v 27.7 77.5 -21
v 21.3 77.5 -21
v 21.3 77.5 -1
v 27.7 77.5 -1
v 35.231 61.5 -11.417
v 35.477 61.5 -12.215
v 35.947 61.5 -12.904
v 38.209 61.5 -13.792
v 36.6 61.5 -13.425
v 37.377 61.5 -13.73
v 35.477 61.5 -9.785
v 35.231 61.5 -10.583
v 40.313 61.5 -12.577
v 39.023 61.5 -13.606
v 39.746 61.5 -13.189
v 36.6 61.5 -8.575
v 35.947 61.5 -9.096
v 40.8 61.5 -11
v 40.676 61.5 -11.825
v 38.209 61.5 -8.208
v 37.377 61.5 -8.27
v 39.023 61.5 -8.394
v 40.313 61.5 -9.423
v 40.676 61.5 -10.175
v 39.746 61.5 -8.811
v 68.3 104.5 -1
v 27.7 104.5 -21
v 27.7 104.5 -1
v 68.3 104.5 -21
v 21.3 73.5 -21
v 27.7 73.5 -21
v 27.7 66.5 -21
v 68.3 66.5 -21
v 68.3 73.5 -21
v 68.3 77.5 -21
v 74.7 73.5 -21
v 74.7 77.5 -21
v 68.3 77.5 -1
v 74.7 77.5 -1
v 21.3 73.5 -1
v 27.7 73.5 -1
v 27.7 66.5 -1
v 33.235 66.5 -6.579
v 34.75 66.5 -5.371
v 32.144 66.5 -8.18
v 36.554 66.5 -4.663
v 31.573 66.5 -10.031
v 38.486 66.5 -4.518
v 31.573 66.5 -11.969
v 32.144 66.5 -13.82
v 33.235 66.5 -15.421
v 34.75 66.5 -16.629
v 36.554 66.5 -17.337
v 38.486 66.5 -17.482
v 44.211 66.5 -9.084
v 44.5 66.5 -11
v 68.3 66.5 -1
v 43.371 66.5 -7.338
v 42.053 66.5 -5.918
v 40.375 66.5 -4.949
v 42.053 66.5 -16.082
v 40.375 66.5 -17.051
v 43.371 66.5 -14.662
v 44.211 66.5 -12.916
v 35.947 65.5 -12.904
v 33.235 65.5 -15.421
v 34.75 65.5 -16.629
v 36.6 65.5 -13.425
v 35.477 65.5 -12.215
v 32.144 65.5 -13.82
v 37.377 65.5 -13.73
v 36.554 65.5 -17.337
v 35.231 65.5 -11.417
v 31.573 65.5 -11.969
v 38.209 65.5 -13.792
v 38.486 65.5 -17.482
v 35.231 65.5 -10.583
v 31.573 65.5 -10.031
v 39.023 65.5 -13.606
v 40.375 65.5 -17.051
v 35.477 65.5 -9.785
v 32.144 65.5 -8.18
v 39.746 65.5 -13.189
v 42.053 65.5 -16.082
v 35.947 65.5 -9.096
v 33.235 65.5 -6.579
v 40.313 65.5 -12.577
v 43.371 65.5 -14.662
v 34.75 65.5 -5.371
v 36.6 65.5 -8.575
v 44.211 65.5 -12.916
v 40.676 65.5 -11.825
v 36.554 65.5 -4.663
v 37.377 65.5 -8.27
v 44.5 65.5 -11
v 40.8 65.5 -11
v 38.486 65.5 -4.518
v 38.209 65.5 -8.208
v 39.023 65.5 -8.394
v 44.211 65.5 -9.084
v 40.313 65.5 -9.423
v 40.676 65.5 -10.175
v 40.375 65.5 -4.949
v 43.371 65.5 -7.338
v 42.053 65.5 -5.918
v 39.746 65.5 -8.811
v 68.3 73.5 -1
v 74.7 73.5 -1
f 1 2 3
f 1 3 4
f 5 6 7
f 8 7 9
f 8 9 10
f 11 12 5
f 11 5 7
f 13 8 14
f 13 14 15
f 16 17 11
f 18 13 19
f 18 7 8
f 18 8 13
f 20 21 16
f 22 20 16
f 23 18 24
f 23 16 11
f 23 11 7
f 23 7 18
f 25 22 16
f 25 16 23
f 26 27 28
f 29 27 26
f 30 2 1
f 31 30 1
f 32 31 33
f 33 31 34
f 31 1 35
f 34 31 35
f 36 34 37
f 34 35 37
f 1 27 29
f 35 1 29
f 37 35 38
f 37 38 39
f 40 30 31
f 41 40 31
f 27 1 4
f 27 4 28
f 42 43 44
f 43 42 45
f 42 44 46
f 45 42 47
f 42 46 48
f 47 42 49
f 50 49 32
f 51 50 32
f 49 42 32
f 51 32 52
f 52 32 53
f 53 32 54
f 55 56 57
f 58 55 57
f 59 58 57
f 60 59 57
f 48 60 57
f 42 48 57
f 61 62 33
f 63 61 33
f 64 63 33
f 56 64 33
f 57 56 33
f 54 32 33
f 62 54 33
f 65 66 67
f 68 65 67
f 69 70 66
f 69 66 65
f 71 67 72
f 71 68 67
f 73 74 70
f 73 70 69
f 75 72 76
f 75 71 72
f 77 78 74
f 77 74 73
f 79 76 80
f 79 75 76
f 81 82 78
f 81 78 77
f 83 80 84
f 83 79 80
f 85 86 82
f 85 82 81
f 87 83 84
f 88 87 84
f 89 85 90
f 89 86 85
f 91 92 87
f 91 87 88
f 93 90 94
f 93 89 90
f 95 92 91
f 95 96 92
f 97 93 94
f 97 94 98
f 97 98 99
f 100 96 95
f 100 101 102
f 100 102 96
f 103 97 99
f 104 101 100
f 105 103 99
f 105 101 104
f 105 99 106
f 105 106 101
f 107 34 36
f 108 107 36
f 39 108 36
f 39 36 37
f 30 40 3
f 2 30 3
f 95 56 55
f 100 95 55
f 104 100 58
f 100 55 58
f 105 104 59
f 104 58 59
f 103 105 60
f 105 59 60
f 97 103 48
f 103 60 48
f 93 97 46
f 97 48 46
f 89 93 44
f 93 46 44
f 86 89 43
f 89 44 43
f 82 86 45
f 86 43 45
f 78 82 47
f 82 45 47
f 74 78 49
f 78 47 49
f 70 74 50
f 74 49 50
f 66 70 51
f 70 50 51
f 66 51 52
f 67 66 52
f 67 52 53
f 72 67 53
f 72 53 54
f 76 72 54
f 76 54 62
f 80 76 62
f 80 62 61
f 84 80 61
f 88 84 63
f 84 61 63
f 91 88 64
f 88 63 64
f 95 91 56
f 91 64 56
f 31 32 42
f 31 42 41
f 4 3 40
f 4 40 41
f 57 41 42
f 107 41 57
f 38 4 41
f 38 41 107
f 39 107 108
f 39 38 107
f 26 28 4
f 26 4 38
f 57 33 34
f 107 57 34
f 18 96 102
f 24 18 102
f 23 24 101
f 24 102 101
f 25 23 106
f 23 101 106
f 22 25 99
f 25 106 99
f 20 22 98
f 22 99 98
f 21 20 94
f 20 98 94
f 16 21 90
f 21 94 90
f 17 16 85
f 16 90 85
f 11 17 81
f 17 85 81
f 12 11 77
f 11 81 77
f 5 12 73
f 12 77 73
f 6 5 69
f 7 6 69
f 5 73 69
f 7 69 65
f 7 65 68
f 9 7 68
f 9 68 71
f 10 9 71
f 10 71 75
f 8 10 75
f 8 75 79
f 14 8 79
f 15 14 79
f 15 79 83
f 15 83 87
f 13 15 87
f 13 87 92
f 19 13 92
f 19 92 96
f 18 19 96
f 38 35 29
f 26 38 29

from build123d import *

# Parameters (mm, degrees)
CYLINDER940_R          = 6.5
CYLINDER940_DEPTH      = 1
CYLINDER940_ROLL_ANGLE = 90
BOX536_W               = 40.6
BOX536_H               = 38
BOX536_DEPTH           = 20
CYLINDER864_R          = 2.8
CYLINDER864_DEPTH      = 10
CYLINDER864_ROLL_ANGLE = 90
BOX537_W               = 53.4
BOX537_H               = 4
BOX537_DEPTH           = 20


with BuildPart() as cylinder1083:
    # Cylinder940 → Cylinder940 (new body)
    with BuildSketch(Plane.XY):
        Circle(CYLINDER940_R)
    extrude(amount=CYLINDER940_DEPTH)


with BuildPart() as cylinder1083_1:
    # Cylinder940 roll: moved
    add(cylinder1083.part.rotate(Axis((0, 0, 0), (1, 0, 0)), CYLINDER940_ROLL_ANGLE))


with BuildPart() as cylinder1083_2:
    # Cylinder940 placement: moved
    add(cylinder1083_1.part.moved(Location((37, 66.5, -11))))


with BuildPart() as cube:
    # Box536 → Box536 (new body)
    with BuildSketch(Plane(origin=(-0.3, 0, 0), x_dir=(1, 0, 0), z_dir=(0, 0, 1))):
        with Locations((20.3, 19)):
            Rectangle(BOX536_W, BOX536_H)
    extrude(amount=BOX536_DEPTH)


with BuildPart() as cylinder1026:
    # Cylinder864 → Cylinder864 (new body)
    with BuildSketch(Plane.XY):
        Circle(CYLINDER864_R)
    extrude(amount=CYLINDER864_DEPTH)


with BuildPart() as cylinder1026_1:
    # Cylinder864 roll: moved
    add(cylinder1026.part.rotate(Axis((0, 0, 0), (1, 0, 0)), CYLINDER864_ROLL_ANGLE))


with BuildPart() as cylinder1026_2:
    # Cylinder864 placement: moved
    add(cylinder1026_1.part.moved(Location((10, 5, 10))))


with BuildPart() as steering_servo:
    # Box537 → Box537 (new body)
    with BuildSketch(Plane(origin=(-6.7, 7, 0), x_dir=(1, 0, 0), z_dir=(0, 0, 1))):
        with Locations((26.7, 2)):
            Rectangle(BOX537_W, BOX537_H)
    extrude(amount=BOX537_DEPTH)

    # Fusion585: union Cube, Cylinder1026
    add(cube.part)
    add(cylinder1026_2.part)


with BuildPart() as steering_servo_1:
    # Fusion585 placement: moved
    add(steering_servo.part.moved(Location((27, 66.5, -21))))

    # Fusion588: union Cylinder1083
    add(cylinder1083_2.part)


with BuildPart() as steering_servo_2:
    # Fusion588 placement: moved
    add(steering_servo_1.part.moved(Location((1, 0, 0))))


solid = steering_servo_2.part
